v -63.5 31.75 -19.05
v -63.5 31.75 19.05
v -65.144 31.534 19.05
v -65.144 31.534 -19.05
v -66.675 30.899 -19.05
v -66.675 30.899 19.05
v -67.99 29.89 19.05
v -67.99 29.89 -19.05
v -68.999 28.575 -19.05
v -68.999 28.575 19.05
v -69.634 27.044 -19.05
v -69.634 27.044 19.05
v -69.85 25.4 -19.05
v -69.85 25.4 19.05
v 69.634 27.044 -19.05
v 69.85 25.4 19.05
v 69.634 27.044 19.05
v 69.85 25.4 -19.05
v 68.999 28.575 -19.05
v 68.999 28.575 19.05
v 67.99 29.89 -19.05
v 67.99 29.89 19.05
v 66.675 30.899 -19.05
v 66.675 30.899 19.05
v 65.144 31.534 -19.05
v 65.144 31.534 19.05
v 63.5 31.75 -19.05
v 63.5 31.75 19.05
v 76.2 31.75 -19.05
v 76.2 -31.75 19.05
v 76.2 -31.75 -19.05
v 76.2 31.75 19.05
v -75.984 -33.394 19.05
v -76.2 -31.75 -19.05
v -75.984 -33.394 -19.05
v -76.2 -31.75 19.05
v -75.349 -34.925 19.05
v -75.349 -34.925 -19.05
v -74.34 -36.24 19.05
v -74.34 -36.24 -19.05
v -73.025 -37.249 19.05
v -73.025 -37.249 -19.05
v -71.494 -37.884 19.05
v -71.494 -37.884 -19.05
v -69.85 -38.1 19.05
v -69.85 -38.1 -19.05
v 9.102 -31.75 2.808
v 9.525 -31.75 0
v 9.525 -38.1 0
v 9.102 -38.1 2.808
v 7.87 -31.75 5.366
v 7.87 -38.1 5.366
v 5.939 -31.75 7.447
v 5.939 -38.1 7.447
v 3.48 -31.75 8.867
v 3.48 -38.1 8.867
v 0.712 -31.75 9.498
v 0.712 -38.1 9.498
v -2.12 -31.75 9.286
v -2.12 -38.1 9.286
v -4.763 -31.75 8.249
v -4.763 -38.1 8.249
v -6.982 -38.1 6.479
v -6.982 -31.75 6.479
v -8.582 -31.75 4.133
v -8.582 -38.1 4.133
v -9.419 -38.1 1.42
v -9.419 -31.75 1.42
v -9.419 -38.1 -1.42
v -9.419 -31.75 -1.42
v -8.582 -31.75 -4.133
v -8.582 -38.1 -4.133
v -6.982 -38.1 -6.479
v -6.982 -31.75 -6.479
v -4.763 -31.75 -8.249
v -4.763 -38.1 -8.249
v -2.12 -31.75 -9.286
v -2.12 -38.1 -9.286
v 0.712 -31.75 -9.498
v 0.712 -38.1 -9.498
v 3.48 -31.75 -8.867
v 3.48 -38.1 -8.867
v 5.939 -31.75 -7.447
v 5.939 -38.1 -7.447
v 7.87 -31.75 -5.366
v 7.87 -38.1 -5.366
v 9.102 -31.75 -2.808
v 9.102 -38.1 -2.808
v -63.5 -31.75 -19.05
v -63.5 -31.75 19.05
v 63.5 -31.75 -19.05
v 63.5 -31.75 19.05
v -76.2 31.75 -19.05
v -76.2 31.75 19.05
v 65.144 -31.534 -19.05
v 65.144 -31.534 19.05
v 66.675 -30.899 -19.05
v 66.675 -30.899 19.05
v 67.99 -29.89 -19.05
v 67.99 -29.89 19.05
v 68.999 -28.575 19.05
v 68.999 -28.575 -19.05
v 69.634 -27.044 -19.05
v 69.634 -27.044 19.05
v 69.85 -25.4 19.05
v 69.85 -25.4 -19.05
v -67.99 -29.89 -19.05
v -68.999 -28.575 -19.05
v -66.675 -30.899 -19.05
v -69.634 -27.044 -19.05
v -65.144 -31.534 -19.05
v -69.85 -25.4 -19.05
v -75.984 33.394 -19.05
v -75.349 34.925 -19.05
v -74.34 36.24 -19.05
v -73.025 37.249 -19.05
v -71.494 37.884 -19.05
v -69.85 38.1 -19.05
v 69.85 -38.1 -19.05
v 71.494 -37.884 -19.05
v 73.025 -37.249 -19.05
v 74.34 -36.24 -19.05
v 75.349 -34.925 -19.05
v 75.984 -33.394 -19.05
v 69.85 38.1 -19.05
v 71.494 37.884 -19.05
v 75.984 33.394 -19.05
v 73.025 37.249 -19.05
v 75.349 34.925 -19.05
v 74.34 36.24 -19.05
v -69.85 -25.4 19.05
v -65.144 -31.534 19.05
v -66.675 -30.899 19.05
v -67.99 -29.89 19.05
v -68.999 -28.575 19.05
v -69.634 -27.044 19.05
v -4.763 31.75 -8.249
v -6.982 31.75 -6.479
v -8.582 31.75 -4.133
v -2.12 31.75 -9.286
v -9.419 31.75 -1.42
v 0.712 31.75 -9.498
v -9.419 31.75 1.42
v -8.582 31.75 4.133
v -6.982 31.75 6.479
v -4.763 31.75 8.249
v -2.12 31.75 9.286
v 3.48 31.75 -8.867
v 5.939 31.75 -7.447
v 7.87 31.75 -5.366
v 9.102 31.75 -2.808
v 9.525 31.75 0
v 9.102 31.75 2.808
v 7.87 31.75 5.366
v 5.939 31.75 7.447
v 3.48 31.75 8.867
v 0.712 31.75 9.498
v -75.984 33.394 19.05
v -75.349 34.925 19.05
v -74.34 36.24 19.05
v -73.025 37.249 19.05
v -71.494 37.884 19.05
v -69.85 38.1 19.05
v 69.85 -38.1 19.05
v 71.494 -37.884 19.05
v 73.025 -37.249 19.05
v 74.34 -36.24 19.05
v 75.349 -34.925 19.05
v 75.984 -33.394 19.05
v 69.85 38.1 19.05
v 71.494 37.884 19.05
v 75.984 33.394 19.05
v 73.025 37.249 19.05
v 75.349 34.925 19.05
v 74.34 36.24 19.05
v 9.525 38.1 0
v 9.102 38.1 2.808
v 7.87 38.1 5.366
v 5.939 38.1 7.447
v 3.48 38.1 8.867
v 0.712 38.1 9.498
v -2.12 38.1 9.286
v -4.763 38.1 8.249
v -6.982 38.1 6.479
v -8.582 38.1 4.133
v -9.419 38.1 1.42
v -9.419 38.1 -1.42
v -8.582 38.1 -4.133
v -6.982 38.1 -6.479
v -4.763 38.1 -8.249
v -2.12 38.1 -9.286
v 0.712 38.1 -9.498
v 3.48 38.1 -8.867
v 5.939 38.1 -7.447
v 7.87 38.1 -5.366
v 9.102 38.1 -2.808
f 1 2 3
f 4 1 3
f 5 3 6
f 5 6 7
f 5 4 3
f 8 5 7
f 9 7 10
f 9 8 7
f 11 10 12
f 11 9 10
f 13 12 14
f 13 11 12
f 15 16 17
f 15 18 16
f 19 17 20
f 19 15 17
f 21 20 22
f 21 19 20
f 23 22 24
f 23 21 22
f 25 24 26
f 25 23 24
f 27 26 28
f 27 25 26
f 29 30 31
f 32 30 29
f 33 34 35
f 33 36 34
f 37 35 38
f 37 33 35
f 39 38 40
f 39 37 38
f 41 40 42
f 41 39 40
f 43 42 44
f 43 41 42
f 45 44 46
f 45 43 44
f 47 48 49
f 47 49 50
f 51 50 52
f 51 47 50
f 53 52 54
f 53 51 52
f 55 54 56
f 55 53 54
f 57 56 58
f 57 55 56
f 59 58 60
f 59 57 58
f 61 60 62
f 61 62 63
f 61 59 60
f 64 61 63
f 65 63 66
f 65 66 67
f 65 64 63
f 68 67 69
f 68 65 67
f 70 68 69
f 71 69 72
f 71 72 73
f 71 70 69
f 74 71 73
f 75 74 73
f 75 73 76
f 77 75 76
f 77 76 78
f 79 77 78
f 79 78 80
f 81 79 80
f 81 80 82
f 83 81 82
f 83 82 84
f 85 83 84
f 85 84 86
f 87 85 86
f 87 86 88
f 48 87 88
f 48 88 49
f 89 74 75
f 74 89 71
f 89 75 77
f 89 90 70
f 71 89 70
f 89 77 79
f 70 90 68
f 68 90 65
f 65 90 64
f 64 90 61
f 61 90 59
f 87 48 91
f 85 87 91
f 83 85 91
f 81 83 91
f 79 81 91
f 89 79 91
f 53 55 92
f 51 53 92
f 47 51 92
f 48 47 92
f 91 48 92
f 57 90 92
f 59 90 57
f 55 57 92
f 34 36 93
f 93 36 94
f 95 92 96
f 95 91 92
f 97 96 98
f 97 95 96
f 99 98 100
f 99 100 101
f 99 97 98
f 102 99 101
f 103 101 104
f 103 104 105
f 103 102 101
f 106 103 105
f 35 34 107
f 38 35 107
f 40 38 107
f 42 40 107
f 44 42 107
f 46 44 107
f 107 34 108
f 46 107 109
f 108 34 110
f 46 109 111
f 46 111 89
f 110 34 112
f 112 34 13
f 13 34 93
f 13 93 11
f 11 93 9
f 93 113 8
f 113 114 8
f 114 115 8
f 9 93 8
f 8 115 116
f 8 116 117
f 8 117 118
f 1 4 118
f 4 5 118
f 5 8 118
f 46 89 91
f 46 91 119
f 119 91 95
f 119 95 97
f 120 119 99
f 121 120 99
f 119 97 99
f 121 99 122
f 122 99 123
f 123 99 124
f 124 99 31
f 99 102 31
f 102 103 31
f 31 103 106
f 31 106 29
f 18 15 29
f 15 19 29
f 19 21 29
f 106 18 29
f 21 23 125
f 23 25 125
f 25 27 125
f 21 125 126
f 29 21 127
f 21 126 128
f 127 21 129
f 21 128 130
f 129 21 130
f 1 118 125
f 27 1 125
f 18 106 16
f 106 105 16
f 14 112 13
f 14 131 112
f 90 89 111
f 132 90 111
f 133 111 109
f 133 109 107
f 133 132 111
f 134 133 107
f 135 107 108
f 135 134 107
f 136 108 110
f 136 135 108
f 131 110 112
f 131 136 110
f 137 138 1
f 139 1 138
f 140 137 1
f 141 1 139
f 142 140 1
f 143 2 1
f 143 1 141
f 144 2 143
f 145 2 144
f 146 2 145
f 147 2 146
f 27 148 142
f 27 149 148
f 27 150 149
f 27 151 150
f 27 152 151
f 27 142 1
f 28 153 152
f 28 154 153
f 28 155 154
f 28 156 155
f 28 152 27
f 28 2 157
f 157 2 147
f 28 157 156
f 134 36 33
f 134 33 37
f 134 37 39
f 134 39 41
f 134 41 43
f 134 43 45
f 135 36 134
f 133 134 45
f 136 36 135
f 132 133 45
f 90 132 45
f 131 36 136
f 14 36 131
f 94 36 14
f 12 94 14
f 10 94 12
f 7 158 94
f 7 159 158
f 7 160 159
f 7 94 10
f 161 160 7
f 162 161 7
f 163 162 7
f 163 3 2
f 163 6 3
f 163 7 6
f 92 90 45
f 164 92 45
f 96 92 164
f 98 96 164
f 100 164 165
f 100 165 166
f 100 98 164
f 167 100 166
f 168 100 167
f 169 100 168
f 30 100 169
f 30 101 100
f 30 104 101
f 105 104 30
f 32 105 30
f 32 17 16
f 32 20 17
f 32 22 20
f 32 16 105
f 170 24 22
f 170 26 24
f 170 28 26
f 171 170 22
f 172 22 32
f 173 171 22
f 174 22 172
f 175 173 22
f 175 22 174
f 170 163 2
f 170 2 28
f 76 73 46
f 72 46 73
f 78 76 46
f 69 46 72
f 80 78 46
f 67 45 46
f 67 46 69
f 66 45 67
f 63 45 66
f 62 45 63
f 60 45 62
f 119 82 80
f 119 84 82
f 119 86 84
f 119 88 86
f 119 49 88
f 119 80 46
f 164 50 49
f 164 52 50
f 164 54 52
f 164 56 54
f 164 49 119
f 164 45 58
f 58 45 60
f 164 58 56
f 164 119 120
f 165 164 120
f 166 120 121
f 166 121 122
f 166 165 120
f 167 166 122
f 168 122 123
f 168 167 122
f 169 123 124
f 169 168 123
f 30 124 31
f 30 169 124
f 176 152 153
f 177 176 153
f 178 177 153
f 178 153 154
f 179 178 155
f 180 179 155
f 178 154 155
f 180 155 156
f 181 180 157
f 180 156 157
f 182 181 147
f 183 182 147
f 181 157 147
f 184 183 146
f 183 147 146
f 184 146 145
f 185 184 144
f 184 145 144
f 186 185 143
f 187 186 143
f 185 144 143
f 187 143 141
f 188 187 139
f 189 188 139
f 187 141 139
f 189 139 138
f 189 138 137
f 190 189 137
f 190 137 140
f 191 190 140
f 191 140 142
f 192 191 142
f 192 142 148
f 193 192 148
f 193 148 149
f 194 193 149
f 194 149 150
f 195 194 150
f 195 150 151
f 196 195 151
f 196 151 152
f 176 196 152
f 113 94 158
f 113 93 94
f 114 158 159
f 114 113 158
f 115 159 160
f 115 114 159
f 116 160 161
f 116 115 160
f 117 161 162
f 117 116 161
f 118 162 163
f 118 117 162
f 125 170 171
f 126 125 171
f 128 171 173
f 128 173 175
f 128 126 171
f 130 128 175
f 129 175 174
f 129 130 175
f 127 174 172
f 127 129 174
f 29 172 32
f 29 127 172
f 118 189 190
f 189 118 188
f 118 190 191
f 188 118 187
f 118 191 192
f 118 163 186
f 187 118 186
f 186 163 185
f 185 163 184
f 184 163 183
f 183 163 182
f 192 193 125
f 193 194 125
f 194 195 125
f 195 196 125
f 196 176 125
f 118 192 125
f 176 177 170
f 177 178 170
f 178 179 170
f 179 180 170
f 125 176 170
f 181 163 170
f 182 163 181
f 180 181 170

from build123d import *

# Parameters (mm, degrees)
F0_W          = 152.4
F0_H          = 76.2
F0_W_2        = 139.7
F0_H_2        = 63.5
F1_DEPTH      = 19.05
F2_R          = 9.525
F3_DEPTH      = 38.1
F3_DEPTH_BACK = 38.1
F4_R          = 6.35


with BuildPart() as f1:
    # F0 (on Top) → F1 (new body, symmetric)
    with BuildSketch(Plane.XY):
        Rectangle(F0_W, F0_H)
        Rectangle(F0_W_2, F0_H_2, mode=Mode.SUBTRACT)
    extrude(amount=F1_DEPTH, both=True)

    # F2 (on Front) → F3 (cut, two sides)
    with BuildSketch(Plane.XZ) as f3_sk:
        Circle(F2_R)
    extrude(amount=F3_DEPTH, mode=Mode.SUBTRACT)
    extrude(f3_sk.sketch, amount=-F3_DEPTH_BACK, mode=Mode.SUBTRACT)

    # F4
    f4_edges = [f1.edges().sort_by_distance(p)[0] for p in [
        (-69.85, -31.75, 0),
        (-69.85, 31.75, 0),
        (69.85, 31.75, 0),
        (69.85, -31.75, 0),
        (-76.2, -38.1, 0),
        (76.2, -38.1, 0),
        (76.2, 38.1, 0),
        (-76.2, 38.1, 0),
    ]]
    fillet(f4_edges, radius=F4_R)


solid = f1.part
